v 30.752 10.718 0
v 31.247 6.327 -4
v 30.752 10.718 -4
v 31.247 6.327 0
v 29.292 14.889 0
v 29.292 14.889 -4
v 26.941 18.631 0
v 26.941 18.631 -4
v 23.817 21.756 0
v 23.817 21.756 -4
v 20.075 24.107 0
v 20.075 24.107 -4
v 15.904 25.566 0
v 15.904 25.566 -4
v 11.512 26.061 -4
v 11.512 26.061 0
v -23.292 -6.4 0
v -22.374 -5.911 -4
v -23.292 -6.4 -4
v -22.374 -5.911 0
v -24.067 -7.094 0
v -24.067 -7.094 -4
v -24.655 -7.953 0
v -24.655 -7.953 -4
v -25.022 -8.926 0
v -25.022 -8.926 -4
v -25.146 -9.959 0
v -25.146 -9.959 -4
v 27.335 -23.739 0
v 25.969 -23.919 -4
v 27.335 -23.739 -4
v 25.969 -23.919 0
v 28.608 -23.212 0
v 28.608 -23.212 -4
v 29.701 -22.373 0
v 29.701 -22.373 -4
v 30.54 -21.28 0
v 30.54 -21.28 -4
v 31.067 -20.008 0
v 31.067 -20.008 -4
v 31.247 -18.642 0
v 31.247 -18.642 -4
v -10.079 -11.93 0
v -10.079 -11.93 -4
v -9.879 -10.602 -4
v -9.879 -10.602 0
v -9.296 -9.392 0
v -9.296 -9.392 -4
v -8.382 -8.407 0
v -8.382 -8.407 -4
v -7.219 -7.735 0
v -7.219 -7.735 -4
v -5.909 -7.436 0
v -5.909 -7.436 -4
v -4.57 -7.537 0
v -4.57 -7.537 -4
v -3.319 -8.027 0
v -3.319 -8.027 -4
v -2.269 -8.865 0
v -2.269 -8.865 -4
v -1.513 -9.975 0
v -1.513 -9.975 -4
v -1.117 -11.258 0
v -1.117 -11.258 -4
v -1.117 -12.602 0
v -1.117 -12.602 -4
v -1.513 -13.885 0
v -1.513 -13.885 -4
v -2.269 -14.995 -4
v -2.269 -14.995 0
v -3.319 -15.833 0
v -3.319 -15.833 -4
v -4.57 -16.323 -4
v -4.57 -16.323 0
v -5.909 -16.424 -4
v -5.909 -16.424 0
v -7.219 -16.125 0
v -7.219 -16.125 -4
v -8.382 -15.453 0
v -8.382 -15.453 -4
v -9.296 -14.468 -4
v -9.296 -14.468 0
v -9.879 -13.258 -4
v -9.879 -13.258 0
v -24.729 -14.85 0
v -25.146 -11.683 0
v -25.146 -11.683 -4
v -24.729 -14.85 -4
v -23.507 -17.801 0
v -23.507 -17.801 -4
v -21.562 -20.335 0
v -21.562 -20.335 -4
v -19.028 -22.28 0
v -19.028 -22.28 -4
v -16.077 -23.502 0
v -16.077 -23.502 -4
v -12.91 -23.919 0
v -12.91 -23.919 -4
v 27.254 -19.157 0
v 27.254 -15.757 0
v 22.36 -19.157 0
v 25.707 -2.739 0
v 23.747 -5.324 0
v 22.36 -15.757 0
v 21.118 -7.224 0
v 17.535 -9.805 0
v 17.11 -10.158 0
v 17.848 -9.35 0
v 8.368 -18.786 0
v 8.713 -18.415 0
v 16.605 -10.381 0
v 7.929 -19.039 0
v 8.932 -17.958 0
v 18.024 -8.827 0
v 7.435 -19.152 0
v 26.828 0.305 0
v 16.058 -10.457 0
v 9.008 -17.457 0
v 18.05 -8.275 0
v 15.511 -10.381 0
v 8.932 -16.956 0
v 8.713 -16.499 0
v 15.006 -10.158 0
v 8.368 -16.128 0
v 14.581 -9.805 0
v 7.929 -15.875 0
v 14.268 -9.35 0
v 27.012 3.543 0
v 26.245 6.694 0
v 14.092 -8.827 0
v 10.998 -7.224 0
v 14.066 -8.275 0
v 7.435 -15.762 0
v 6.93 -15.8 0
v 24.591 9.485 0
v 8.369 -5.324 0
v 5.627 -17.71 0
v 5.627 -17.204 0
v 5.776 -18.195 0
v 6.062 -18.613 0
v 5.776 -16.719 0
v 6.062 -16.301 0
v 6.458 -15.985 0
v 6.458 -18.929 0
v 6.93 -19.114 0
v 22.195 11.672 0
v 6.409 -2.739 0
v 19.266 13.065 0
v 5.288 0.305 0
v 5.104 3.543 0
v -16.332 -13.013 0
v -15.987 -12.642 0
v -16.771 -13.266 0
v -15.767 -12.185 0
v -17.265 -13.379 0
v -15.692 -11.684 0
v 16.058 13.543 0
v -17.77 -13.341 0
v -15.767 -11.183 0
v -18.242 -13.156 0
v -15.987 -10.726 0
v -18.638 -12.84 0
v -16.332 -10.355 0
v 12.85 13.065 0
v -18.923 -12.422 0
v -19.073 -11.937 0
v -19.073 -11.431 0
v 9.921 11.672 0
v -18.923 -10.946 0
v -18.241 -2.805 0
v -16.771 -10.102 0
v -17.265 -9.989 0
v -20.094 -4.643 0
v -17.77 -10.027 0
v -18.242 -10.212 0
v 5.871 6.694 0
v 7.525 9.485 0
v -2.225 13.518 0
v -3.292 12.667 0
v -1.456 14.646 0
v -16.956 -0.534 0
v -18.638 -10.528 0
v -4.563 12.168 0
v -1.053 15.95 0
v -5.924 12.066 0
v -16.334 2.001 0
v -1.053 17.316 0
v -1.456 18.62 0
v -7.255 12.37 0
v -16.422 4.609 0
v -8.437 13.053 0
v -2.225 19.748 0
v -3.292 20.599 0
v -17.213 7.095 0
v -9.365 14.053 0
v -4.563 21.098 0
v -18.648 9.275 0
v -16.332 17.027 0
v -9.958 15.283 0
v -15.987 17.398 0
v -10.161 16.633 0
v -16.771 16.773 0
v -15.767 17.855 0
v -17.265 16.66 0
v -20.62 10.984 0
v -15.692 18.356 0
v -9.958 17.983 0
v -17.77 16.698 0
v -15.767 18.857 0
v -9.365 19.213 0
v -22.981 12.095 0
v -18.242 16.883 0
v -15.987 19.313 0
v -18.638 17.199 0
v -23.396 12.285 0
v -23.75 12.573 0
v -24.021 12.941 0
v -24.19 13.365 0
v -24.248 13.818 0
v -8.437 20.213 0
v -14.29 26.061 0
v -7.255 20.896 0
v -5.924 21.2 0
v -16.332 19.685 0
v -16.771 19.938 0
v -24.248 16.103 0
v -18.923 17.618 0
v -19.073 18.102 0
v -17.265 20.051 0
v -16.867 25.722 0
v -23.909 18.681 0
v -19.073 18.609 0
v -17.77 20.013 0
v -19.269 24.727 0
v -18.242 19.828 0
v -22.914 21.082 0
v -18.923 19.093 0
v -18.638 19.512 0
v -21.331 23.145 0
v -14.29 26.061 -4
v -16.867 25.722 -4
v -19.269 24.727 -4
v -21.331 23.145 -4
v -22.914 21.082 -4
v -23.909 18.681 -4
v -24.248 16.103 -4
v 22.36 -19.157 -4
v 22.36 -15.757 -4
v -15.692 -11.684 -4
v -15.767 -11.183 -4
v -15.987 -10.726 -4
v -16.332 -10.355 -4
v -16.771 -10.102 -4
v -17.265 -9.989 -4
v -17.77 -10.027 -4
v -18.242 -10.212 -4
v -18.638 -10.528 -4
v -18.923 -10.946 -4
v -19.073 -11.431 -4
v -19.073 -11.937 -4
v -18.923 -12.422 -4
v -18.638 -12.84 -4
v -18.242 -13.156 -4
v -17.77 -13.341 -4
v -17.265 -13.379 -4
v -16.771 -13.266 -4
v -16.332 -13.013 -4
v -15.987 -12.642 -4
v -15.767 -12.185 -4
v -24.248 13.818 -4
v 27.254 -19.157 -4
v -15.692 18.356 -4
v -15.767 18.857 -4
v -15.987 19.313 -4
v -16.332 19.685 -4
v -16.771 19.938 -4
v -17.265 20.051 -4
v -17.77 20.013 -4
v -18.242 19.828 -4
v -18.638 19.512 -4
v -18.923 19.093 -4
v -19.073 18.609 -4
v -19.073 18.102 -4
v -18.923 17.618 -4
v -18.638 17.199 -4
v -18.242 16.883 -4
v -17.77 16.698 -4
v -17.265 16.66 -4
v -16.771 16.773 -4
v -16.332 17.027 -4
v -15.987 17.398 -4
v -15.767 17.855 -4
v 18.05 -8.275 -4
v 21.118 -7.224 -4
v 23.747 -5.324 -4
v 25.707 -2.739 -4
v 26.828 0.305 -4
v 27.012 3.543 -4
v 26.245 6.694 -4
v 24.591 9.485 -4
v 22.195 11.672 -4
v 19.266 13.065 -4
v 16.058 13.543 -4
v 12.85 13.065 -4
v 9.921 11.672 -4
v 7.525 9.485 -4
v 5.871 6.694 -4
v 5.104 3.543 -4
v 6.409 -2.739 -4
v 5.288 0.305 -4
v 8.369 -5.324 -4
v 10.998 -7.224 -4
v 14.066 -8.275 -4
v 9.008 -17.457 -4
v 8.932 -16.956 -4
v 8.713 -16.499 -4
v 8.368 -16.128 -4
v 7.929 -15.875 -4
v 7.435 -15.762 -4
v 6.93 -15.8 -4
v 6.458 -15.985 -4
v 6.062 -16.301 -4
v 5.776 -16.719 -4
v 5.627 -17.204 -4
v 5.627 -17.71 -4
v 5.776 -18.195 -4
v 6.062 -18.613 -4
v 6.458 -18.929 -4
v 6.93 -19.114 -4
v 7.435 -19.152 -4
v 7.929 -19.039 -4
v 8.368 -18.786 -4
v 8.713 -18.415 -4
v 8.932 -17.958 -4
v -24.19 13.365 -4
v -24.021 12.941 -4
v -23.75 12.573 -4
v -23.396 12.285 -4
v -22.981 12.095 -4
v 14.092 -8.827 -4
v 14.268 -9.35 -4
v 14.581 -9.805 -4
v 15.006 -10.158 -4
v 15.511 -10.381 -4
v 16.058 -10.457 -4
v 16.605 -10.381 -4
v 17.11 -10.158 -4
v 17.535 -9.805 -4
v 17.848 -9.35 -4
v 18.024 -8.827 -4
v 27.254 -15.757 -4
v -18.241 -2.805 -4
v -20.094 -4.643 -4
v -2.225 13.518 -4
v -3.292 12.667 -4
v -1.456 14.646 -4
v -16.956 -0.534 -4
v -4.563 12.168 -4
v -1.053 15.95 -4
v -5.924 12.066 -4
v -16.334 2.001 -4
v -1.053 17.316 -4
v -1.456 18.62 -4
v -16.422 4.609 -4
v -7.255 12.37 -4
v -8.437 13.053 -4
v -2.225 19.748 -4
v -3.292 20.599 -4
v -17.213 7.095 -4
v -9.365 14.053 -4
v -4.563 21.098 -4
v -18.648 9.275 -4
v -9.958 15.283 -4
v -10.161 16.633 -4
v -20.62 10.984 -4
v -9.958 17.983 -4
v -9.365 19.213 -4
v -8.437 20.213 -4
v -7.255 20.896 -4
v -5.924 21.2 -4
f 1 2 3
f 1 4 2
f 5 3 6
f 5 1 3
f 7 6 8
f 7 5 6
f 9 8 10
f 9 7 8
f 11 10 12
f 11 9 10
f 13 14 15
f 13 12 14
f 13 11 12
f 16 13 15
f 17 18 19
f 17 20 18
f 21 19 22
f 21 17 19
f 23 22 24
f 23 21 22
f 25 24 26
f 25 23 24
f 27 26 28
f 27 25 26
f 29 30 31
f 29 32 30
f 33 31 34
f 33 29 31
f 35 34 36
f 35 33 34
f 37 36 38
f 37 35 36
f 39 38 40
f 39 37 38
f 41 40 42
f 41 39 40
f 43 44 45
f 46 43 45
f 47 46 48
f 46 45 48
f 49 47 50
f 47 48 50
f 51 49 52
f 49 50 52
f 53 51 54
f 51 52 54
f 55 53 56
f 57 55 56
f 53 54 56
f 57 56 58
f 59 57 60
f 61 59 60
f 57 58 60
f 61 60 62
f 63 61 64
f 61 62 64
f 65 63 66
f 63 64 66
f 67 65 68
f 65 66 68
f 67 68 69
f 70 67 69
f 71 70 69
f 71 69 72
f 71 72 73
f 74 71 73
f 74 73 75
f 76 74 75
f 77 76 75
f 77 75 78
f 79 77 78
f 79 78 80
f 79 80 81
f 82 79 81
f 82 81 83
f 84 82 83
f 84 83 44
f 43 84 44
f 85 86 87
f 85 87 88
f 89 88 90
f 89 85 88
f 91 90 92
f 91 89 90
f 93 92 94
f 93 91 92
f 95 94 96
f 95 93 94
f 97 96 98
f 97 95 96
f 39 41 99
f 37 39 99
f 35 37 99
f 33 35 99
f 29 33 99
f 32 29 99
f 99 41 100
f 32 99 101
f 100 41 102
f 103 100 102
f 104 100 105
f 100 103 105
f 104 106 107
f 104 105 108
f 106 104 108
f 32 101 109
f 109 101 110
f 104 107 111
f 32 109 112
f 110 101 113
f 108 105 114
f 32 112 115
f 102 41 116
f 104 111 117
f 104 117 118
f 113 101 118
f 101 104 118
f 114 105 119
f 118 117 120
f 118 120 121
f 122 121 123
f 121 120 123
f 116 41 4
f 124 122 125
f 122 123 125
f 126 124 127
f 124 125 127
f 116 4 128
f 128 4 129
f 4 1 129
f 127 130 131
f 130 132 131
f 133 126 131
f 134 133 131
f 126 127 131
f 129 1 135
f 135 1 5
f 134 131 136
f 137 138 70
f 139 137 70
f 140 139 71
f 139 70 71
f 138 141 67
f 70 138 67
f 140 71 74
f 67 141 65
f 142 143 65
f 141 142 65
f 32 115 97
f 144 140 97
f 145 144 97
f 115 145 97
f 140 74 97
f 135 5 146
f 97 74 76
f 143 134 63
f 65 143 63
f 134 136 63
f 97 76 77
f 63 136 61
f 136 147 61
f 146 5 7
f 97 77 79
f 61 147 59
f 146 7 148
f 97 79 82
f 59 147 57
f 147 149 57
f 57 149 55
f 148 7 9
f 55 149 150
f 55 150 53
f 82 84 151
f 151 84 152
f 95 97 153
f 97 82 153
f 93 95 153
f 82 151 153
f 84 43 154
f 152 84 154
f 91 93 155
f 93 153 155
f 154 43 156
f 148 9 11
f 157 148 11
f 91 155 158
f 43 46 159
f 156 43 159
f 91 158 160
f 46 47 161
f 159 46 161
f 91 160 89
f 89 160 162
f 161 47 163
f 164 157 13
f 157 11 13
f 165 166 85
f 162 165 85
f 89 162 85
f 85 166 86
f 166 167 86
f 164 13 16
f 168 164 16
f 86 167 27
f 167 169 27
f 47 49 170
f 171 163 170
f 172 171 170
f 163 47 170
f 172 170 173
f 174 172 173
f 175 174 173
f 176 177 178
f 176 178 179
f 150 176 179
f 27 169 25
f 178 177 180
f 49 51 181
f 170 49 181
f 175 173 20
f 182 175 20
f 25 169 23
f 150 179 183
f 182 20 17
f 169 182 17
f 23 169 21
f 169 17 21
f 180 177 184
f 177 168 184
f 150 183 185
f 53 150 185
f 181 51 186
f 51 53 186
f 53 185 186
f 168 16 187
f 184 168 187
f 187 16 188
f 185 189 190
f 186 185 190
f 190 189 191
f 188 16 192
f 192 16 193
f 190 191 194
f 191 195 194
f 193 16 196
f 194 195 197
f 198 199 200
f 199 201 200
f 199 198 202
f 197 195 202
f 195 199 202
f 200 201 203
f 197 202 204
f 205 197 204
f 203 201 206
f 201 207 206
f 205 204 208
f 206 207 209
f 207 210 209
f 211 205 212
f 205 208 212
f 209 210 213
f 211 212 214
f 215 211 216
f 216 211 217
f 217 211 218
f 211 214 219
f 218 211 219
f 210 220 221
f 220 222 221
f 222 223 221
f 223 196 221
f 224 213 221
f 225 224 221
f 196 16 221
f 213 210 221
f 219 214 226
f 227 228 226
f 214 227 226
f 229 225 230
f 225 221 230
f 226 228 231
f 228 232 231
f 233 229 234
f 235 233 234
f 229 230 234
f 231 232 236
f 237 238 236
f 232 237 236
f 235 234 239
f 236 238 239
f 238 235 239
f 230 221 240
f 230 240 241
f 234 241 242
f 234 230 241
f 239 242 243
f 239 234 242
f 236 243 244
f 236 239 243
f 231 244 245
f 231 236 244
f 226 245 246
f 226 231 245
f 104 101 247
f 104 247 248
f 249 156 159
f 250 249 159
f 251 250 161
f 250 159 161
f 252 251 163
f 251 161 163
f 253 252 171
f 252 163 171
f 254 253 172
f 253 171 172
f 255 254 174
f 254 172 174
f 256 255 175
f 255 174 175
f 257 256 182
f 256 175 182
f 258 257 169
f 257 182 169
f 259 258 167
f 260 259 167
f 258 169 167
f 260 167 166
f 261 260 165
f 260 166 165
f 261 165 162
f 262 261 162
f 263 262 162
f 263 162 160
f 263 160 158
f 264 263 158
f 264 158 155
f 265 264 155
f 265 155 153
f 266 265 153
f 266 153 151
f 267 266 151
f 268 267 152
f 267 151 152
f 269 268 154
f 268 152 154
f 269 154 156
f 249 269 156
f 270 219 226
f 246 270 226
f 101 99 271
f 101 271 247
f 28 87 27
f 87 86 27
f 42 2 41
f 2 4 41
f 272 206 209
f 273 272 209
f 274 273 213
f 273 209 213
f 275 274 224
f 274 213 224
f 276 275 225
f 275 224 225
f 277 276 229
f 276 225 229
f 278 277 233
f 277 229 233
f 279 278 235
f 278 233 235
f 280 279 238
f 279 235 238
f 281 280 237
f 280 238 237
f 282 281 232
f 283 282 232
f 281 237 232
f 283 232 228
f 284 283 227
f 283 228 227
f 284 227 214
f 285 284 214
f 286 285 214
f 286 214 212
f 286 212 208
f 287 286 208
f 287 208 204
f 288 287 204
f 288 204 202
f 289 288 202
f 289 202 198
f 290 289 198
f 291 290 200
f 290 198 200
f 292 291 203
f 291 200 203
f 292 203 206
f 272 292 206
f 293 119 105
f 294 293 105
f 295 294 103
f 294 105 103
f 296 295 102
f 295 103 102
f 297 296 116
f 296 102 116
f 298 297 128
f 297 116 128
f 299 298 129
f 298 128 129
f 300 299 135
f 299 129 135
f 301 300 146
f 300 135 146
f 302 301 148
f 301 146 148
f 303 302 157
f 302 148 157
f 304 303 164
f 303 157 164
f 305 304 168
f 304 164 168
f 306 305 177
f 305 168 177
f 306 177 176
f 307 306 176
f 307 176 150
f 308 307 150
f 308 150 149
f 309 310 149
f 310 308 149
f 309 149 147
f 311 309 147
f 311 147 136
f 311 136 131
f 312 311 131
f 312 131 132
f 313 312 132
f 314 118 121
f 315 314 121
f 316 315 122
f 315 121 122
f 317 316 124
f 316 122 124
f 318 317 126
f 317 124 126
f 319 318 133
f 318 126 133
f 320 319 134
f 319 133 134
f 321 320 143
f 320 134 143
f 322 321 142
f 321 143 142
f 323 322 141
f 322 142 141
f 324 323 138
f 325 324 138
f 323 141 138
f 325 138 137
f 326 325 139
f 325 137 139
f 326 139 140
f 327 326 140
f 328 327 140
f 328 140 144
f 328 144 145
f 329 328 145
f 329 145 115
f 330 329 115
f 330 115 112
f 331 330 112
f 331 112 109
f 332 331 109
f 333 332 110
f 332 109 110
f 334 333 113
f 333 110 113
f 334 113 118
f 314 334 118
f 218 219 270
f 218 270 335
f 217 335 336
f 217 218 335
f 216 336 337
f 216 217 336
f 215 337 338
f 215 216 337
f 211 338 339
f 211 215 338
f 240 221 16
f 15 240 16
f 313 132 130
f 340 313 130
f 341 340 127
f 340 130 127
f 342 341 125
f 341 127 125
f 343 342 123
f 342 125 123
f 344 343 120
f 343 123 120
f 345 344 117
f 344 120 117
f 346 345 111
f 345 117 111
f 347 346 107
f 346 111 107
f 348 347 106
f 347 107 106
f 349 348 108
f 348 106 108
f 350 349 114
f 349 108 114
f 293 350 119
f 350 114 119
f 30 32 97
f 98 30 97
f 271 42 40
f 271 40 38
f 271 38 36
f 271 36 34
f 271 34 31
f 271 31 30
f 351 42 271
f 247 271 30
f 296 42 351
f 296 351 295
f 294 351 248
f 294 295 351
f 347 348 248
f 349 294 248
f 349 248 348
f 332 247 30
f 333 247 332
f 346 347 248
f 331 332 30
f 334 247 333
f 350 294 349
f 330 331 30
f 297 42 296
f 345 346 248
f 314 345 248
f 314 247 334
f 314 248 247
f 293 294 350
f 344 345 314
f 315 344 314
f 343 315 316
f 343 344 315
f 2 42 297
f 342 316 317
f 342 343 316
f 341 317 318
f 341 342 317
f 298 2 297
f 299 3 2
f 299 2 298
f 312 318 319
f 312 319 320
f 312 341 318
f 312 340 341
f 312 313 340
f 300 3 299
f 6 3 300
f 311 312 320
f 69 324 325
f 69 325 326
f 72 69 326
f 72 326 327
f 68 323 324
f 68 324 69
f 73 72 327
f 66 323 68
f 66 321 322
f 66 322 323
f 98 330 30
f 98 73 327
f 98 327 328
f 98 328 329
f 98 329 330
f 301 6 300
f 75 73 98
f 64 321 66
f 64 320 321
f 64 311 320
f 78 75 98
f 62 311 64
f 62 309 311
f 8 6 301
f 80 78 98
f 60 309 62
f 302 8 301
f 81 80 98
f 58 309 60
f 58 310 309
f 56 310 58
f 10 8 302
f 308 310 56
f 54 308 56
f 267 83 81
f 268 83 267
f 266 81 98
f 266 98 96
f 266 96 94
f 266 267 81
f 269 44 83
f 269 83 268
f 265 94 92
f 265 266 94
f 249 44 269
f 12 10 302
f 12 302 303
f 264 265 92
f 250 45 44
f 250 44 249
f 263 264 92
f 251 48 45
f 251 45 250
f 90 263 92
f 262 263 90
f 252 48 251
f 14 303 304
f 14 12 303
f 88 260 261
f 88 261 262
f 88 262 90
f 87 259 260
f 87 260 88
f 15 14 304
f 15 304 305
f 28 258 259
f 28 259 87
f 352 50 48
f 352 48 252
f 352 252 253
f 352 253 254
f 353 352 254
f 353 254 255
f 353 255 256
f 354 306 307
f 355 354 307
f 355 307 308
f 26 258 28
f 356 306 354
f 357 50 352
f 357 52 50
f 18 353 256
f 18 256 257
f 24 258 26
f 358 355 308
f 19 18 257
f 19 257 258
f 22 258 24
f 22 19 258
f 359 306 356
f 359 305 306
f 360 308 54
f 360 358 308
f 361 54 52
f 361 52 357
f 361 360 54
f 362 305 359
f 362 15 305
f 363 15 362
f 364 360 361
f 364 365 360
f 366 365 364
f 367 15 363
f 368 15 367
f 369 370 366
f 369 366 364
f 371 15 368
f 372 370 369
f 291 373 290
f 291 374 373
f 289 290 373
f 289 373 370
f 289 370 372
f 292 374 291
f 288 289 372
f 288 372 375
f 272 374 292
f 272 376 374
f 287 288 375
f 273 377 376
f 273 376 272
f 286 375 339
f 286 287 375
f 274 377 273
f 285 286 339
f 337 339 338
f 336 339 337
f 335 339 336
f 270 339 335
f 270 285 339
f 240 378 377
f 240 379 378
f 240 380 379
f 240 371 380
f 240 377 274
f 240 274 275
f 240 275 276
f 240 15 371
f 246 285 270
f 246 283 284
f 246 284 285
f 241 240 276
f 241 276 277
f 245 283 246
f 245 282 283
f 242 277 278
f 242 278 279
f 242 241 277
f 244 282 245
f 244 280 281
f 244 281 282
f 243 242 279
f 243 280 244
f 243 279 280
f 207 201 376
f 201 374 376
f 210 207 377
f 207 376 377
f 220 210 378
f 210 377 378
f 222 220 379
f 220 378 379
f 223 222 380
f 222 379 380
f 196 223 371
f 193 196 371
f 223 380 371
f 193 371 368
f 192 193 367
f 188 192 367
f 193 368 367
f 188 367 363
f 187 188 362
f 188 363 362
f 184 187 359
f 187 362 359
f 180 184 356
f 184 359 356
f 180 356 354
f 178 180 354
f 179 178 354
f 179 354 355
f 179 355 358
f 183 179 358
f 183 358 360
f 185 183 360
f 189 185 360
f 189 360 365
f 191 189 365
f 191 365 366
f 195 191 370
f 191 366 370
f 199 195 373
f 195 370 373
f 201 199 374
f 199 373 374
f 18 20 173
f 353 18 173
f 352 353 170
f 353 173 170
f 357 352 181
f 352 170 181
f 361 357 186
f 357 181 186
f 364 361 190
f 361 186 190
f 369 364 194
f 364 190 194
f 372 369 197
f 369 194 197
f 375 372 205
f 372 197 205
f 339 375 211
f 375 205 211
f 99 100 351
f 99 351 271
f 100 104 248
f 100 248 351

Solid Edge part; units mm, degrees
sketch "Sketch1" plane through (0, 0, 0) normal (0, 0, 1) x (1, 0, 0)
  arc A0 (-24.2481, 16.1032) -> (-14.29, 26.0612) centre (-14.29, 16.1032) cw
  line L0 (-14.29, 26.0612) -> (11.5125, 26.0612)
  arc A1 (11.5125, 26.0612) -> (31.2468, 6.3269) centre (11.5125, 6.3269) cw
  line L1 (31.2468, 6.3269) -> (31.2468, -18.6416)
  arc A2 (31.2468, -18.6416) -> (25.9694, -23.9191) centre (25.9694, -18.6416) cw
  line L2 (25.9694, -23.9191) -> (-12.9101, -23.9191)
  arc A3 (-12.9101, -23.9191) -> (-25.1463, -11.683) centre (-12.9101, -11.683) cw
  line L3 (-25.1463, -11.683) -> (-25.1463, -9.9593)
  arc A4 (-25.1463, -9.9593) -> (-22.3744, -5.9106) centre (-20.8035, -9.9593) cw
  arc A5 (-22.3744, -5.9106) -> (-22.9813, 12.095) centre (-25.8263, 2.9861) ccw
  arc A6 (-22.9813, 12.095) -> (-24.2481, 13.8177) centre (-22.4432, 13.8177) cw
  line L4 (-24.2481, 13.8177) -> (-24.2481, 16.1032)
  circle A7 centre (7.308, -17.457) radius 1.7
  arc A8 (18.0497, -8.2752) -> (14.0663, -8.2752) centre (16.058, -8.457) cw
  arc A9 (14.0663, -8.2752) -> (18.0497, -8.2752) centre (16.058, 2.543) cw
  circle A10 centre (-17.3918, -11.684) radius 1.7
  circle A11 centre (-17.3918, 18.3557) radius 1.7
  line L5 (27.2537, -19.157) -> (22.3605, -19.157)
  line L6 (27.2537, -15.757) -> (27.2537, -19.157)
  line L7 (22.3605, -15.757) -> (27.2537, -15.757)
  line L8 (22.3605, -19.157) -> (22.3605, -15.757)
extrude "Protrusion1" add sketch "Sketch1" against normal blind 4
sketch "Sketch2" plane through (3.0503, 1.0711, -4) normal (0, 0, -1) x (-1, 0, 0)
  circle A0 centre (8.6319, 15.5619) radius 4.5794
  circle A1 centre (8.6229, -13.0011) radius 4.5063
extrude "Cutout1" cut sketch "Sketch2" against normal up to next
